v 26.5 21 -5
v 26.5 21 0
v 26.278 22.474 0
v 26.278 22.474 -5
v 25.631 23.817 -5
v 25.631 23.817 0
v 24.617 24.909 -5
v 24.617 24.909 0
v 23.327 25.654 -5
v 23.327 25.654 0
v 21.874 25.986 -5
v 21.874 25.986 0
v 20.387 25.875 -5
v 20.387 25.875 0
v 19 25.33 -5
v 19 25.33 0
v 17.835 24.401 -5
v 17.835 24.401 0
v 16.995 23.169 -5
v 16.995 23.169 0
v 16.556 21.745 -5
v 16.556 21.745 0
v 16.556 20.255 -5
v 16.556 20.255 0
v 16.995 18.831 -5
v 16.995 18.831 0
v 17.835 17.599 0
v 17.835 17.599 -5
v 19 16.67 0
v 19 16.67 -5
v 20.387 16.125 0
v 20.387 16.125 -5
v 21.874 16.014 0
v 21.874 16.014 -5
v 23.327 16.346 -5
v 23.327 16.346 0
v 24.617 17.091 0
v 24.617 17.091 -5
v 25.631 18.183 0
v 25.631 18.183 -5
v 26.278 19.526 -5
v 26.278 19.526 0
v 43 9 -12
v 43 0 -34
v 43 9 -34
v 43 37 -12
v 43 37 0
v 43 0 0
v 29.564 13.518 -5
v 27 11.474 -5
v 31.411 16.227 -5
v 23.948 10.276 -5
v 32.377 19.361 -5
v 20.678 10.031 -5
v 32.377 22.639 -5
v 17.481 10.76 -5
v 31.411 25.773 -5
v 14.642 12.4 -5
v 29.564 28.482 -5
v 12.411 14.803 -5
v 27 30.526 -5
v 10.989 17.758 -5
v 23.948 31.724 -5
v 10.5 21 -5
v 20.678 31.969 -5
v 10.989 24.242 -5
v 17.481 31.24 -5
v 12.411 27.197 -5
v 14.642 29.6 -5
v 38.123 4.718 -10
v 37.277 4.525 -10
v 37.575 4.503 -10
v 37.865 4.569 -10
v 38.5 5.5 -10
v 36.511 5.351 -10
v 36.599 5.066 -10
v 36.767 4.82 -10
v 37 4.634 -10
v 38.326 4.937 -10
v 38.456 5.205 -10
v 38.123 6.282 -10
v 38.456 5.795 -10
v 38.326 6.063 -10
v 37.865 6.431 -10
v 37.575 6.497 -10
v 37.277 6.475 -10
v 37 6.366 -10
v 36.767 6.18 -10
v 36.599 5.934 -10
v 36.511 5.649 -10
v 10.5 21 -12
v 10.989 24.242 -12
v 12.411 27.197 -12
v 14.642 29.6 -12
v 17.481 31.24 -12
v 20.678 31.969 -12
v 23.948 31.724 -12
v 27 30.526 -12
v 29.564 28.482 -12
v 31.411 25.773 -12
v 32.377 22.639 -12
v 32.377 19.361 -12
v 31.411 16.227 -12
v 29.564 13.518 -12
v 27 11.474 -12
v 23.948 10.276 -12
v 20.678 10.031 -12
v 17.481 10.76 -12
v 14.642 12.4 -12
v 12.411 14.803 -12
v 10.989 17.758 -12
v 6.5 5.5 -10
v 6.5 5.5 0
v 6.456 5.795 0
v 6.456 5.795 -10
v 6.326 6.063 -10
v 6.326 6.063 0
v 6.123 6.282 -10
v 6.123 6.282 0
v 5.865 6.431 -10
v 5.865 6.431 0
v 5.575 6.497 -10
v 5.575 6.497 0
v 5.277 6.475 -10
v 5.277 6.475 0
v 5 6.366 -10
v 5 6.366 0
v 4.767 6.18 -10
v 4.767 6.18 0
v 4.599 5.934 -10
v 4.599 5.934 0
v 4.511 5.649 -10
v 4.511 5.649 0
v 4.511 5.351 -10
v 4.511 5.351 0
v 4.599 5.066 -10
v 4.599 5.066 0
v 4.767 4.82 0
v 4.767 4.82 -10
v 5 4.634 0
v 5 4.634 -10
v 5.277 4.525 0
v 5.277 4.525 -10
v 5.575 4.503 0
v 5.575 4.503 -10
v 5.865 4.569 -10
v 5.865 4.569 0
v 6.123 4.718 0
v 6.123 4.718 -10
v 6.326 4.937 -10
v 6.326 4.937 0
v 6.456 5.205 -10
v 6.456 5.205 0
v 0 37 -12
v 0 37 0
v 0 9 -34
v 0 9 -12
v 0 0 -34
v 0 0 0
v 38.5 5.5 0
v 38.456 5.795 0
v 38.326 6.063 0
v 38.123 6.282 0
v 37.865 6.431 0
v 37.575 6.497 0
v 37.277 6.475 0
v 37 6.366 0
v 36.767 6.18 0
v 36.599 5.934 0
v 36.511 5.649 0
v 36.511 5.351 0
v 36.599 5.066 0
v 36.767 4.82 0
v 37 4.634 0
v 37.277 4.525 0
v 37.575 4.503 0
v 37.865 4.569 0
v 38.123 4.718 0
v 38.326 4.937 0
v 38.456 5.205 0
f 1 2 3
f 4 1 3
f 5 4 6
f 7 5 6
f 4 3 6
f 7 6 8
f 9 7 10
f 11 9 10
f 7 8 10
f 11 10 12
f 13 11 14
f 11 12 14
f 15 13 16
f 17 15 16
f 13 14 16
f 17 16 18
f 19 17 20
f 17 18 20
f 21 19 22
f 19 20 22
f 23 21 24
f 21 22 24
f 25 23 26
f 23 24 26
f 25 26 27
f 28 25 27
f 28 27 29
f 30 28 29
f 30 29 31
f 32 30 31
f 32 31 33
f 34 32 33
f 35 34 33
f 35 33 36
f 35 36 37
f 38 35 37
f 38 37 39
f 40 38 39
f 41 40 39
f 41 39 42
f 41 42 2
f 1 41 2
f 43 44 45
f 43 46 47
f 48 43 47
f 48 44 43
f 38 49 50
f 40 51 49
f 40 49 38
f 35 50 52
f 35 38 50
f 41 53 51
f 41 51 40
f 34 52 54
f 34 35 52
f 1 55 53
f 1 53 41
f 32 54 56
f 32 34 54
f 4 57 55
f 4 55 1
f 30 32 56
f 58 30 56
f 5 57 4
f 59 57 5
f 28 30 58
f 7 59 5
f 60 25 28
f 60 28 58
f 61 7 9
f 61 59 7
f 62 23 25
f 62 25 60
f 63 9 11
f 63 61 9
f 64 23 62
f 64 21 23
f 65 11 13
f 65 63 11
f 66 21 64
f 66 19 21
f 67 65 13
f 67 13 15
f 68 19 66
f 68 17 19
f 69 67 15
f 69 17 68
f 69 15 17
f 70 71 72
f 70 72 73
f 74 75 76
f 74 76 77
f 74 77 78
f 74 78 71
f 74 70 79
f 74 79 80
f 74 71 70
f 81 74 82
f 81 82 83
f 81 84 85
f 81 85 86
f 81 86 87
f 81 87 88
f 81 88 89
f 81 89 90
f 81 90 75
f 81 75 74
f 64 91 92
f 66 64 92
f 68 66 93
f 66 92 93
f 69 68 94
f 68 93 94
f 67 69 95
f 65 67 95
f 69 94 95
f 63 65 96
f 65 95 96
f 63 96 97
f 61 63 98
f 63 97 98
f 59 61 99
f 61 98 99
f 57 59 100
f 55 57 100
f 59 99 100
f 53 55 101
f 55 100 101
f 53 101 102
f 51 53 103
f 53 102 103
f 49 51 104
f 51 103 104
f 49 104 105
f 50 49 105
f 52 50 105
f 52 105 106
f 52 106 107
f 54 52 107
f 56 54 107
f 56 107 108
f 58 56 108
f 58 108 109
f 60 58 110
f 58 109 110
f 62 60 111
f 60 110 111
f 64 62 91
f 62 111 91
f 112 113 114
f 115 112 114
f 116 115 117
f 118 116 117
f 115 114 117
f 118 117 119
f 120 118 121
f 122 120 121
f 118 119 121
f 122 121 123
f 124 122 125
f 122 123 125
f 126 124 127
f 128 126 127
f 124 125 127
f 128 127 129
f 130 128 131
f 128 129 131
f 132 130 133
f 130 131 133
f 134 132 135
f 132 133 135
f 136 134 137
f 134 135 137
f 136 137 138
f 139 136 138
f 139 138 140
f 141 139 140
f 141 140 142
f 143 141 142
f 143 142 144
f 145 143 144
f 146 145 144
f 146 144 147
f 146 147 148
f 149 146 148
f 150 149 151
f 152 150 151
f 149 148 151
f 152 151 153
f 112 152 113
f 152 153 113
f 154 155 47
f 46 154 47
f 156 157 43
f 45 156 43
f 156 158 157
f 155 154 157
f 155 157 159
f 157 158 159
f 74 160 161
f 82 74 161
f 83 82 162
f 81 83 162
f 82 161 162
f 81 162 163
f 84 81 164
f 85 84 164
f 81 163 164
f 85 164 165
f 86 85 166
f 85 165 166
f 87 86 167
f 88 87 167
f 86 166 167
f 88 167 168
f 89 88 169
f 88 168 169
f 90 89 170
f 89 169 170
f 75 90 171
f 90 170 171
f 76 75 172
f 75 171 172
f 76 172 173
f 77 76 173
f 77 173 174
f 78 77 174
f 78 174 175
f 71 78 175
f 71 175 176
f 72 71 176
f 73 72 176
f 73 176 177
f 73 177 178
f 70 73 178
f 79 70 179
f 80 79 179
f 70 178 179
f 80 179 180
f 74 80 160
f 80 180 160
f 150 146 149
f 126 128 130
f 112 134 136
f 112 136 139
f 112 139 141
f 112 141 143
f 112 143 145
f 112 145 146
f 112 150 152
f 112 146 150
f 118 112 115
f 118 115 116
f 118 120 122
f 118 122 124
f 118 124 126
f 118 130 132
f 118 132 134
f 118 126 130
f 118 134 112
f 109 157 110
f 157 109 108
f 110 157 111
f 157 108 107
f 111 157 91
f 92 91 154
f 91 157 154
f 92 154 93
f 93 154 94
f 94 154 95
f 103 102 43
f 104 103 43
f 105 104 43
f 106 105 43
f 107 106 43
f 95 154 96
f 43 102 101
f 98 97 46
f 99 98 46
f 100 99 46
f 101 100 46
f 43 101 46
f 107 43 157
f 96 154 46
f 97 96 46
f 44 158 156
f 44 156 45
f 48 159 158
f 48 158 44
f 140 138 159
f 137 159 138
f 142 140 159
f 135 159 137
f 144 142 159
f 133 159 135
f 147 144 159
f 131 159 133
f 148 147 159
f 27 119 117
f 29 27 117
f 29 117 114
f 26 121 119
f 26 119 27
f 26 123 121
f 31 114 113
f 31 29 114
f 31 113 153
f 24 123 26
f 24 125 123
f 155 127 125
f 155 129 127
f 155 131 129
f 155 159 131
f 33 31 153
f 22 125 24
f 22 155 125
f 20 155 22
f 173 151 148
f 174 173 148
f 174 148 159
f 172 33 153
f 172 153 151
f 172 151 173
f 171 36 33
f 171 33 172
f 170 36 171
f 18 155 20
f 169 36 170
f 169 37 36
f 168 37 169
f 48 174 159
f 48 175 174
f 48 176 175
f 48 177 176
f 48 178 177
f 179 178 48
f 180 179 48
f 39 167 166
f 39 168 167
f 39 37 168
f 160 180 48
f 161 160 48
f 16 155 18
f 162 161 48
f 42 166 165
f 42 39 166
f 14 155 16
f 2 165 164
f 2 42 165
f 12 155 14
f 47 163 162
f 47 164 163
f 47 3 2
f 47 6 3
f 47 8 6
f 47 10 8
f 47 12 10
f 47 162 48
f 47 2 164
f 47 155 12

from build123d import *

# Parameters (mm, degrees)
SKETCH2_W           = 43
SKETCH2_H           = 37
SKETCH2_R           = 5
BOSS_EXTRUDE1_DEPTH = 12
SKETCH3_R           = 11
CUT_EXTRUDE1_DEPTH  = 7
SKETCH4_W           = 43
SKETCH4_H           = 34
BOSS_EXTRUDE2_DEPTH = 9
SKETCH5_R           = 1
CUT_EXTRUDE2_DEPTH  = 10


with BuildPart() as part:
    # Sketch2 → Boss-Extrude1 (new body)
    with BuildSketch(Plane.XY):
        with Locations((21.5, 18.5)):
            Rectangle(SKETCH2_W, SKETCH2_H)
        with Locations((21.5, 21)):
            Circle(SKETCH2_R, mode=Mode.SUBTRACT)
    extrude(amount=-BOSS_EXTRUDE1_DEPTH)

    # Sketch3 → Cut-Extrude1 (cut)
    with BuildSketch(Plane(origin=(0, 0, -12), x_dir=(-1, 0, 0), z_dir=(0, 0, -1))):
        with Locations((-21.5, 21)):
            Circle(SKETCH3_R)
    extrude(amount=-CUT_EXTRUDE1_DEPTH, mode=Mode.SUBTRACT)

    # Sketch4 → Boss-Extrude2 (add)
    with BuildSketch(Plane.XZ):
        with Locations((21.5, -17)):
            Rectangle(SKETCH4_W, SKETCH4_H)
    extrude(amount=-BOSS_EXTRUDE2_DEPTH)

    # Sketch5 → Cut-Extrude2 (cut)
    with BuildSketch(Plane.XY):
        with Locations((5.5, 5.5)):
            Circle(SKETCH5_R)
        with Locations((37.5, 5.5)):
            Circle(SKETCH5_R)
    extrude(amount=-CUT_EXTRUDE2_DEPTH, mode=Mode.SUBTRACT)


solid = part.part
